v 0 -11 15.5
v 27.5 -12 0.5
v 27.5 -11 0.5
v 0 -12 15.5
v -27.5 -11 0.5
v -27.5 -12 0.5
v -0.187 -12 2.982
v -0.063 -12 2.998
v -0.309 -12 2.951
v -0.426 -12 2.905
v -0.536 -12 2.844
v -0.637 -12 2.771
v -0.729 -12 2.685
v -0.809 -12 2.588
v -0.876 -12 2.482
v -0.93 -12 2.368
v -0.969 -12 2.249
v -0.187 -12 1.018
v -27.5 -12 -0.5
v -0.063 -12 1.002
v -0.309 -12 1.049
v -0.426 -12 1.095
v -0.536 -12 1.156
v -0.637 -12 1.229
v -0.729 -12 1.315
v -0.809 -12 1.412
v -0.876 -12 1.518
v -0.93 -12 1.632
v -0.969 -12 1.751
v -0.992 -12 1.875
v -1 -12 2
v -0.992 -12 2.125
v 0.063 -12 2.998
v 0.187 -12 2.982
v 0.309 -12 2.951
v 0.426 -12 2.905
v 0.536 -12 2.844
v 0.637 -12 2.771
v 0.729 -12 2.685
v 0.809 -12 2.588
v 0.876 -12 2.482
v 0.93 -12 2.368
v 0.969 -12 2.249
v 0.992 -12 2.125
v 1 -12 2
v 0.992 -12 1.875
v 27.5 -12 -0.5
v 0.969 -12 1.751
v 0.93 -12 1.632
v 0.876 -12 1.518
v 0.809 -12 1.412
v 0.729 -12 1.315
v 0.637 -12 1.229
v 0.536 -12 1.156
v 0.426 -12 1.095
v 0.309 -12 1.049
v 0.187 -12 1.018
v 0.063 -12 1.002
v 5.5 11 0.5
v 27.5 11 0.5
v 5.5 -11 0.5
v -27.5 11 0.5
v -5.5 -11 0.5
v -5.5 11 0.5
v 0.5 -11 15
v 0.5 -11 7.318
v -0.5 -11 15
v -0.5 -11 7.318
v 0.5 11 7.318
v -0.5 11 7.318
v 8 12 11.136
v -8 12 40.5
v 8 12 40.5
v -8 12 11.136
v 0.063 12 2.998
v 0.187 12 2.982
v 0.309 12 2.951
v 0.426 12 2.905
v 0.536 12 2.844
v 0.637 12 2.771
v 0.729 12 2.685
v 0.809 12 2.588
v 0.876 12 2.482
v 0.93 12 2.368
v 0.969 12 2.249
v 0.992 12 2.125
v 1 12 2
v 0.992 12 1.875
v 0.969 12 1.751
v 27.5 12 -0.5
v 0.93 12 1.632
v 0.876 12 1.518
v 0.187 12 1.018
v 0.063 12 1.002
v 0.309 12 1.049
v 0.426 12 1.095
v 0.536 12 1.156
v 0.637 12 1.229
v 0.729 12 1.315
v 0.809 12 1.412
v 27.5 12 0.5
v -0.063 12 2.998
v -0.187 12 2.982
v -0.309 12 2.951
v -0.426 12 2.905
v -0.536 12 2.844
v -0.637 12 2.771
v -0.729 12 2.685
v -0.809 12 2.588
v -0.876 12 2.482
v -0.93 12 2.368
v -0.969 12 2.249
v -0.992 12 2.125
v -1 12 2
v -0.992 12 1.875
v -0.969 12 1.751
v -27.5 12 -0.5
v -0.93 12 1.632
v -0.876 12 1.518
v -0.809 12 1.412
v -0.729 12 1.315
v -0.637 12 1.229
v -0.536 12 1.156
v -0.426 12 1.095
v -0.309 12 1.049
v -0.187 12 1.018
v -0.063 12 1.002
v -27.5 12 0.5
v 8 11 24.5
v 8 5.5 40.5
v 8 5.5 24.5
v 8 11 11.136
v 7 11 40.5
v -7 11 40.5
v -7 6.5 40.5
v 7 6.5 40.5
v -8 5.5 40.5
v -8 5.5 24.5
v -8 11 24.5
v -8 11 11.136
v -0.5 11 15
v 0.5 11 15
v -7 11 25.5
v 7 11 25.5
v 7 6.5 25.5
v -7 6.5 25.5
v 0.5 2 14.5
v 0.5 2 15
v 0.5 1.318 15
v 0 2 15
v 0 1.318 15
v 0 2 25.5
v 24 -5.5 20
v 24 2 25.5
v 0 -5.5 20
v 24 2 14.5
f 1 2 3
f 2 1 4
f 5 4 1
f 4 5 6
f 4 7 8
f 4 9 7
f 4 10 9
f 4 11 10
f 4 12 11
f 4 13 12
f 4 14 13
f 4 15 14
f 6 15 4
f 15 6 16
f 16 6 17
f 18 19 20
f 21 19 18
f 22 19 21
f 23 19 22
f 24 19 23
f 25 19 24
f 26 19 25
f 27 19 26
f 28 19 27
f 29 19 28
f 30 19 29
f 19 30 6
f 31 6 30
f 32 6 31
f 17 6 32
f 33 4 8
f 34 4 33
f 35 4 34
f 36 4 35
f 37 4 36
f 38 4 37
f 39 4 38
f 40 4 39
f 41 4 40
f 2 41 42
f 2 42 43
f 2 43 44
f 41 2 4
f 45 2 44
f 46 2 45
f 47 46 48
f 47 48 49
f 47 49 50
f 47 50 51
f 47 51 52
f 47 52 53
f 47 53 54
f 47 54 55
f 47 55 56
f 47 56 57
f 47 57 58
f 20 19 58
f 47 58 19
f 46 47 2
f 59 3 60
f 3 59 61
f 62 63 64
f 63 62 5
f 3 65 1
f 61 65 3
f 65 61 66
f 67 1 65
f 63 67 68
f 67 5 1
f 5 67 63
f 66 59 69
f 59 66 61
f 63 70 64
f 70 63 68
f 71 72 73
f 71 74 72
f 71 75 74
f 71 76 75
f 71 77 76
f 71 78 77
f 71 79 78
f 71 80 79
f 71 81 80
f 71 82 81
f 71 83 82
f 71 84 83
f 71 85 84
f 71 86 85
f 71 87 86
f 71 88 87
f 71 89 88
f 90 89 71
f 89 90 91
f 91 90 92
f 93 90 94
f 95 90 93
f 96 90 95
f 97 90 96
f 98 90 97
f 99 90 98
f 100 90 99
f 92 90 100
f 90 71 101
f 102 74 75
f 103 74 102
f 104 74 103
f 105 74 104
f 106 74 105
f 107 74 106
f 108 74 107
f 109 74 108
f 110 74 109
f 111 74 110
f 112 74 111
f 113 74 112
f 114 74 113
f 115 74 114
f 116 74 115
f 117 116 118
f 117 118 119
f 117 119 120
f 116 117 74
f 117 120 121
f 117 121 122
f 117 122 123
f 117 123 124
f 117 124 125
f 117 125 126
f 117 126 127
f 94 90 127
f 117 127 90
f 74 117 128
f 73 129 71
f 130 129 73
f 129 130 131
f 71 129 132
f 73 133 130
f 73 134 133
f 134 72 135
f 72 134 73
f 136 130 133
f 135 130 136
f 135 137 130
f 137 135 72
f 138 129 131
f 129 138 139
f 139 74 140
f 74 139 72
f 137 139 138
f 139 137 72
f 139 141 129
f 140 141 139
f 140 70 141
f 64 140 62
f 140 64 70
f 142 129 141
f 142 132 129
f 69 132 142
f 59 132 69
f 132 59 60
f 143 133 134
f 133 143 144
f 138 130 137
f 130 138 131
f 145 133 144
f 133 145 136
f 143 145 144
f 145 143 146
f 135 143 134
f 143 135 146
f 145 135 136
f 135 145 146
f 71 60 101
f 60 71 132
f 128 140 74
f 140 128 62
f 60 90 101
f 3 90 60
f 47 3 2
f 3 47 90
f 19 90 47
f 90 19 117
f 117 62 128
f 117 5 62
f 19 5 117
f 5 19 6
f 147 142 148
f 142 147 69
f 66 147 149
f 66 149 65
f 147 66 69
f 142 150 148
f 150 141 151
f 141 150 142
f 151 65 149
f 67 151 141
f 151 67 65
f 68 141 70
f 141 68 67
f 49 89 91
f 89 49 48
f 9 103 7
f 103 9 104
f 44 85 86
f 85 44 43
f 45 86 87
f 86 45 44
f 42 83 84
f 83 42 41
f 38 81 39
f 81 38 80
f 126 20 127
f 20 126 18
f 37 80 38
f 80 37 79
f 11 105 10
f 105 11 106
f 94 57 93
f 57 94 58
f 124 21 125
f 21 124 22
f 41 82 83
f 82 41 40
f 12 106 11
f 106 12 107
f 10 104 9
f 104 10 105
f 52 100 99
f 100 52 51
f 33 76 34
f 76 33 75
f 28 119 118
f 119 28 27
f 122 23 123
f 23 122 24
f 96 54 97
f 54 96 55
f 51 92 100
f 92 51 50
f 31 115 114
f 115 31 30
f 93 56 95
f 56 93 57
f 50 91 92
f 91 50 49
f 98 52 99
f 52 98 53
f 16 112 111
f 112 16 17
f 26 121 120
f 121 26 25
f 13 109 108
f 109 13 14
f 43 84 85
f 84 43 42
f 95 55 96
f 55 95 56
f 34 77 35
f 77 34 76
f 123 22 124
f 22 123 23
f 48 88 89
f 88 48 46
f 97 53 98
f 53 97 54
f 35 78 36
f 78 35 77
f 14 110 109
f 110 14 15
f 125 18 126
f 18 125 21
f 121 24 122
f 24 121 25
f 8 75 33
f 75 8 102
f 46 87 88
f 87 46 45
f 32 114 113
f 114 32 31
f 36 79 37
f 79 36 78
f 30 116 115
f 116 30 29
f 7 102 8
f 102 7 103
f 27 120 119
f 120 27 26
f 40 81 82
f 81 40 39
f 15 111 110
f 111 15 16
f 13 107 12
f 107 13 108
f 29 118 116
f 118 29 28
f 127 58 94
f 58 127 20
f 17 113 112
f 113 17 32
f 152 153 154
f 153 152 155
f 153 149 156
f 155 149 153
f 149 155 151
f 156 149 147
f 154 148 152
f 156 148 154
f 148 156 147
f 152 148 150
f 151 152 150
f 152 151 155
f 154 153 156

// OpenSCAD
// file: raingauge_parameters.scad
$fn = 50;
thickness = 1;
magnet_diameter = 14;
magnet_thickness = 4.5;
tipper_width = 55;
tipper_depth = 24;
tipper_height =15;
tipper_arm = 40;
tipper_arm_width = magnet_diameter+2*thickness;

// Base Parameters

ramp_height = 10;
ramp_depth = tipper_depth+2;
base_width = 80;
base_depth = base_width*0.7;
base_height = base_width*1.25;

tip_height = 30;

hall_effect_holes = 12;


module triangular_section(l,w,h){
    polyhedron(
    points=[[-l,0,0], [l,0,0], [l,w,0], [-l,w,0], [0,0,h], [0,w,h]],
    faces=[[5,4,0,3],[1,2,3,0],[5,2,1,4],[5,3,2],[1,0,4]]
          );
}

module triangular_section2(l,w,h){
    polyhedron(
    points=[[0,0,0], [l,0,0], [l,w,0], [0,w,0], [l,0,h], [l,w,h]],
    faces=[[5,4,0,3],[1,2,3,0],[5,2,1,4],[5,3,2],[1,0,4]]
          );
}

module pyramid(l,w,h){
 polyhedron(
  points=[ [l,w,0],[l,-w,0],[-l,-w,0],[-l,w,0], // the four points at base
           [0,0,h]  ],                                 // the apex point 
  faces=[ [0,1,4],[1,2,4],[2,3,4],[3,0,4],              // each triangle side
              [1,0,3],[2,1,3] ]                         // two triangles for square base
 );
}
// main file
// ----- EXTERNAL FILES
include <raingauge_parameters.scad>


difference(){
union(){
    cube([tipper_width,tipper_depth,thickness], center=true); // base plate
    translate([0,0,thickness/2]){
       translate([0,-tipper_depth/2,0]){
           triangular_section(tipper_width/2, thickness, tipper_height);
           triangular_section(tipper_width/10, tipper_depth, tipper_height/2);
       }; 
       translate([0,tipper_depth/2-thickness,0]){
            triangular_section(tipper_width/2, thickness, tipper_height);
            translate([-tipper_arm_width/2,0,0]){
                cube([tipper_arm_width,thickness,tipper_arm], center=false);
                translate([0,-magnet_thickness-thickness,tipper_arm-tipper_arm_width]){
            difference(){
            cube([tipper_arm_width, magnet_thickness+thickness, tipper_arm_width], center=false);
            translate([thickness,thickness,thickness]){
                cube([magnet_diameter, magnet_thickness, magnet_diameter+thickness], center=false);
        }}}}};
    }
    translate([0,0,tipper_height/2]){
        cube([thickness,tipper_depth,tipper_height], center=true);
    }
}
    rotate([90, 0, 0])
    translate([0, 2, 0]){
        cylinder(h = 50, r=1, center=true);
    }
}
translate([0, 2, 20])
rotate([90, 90, 0])
    {
triangular_section(tipper_width/10, tipper_depth, tipper_height/2);
    }
